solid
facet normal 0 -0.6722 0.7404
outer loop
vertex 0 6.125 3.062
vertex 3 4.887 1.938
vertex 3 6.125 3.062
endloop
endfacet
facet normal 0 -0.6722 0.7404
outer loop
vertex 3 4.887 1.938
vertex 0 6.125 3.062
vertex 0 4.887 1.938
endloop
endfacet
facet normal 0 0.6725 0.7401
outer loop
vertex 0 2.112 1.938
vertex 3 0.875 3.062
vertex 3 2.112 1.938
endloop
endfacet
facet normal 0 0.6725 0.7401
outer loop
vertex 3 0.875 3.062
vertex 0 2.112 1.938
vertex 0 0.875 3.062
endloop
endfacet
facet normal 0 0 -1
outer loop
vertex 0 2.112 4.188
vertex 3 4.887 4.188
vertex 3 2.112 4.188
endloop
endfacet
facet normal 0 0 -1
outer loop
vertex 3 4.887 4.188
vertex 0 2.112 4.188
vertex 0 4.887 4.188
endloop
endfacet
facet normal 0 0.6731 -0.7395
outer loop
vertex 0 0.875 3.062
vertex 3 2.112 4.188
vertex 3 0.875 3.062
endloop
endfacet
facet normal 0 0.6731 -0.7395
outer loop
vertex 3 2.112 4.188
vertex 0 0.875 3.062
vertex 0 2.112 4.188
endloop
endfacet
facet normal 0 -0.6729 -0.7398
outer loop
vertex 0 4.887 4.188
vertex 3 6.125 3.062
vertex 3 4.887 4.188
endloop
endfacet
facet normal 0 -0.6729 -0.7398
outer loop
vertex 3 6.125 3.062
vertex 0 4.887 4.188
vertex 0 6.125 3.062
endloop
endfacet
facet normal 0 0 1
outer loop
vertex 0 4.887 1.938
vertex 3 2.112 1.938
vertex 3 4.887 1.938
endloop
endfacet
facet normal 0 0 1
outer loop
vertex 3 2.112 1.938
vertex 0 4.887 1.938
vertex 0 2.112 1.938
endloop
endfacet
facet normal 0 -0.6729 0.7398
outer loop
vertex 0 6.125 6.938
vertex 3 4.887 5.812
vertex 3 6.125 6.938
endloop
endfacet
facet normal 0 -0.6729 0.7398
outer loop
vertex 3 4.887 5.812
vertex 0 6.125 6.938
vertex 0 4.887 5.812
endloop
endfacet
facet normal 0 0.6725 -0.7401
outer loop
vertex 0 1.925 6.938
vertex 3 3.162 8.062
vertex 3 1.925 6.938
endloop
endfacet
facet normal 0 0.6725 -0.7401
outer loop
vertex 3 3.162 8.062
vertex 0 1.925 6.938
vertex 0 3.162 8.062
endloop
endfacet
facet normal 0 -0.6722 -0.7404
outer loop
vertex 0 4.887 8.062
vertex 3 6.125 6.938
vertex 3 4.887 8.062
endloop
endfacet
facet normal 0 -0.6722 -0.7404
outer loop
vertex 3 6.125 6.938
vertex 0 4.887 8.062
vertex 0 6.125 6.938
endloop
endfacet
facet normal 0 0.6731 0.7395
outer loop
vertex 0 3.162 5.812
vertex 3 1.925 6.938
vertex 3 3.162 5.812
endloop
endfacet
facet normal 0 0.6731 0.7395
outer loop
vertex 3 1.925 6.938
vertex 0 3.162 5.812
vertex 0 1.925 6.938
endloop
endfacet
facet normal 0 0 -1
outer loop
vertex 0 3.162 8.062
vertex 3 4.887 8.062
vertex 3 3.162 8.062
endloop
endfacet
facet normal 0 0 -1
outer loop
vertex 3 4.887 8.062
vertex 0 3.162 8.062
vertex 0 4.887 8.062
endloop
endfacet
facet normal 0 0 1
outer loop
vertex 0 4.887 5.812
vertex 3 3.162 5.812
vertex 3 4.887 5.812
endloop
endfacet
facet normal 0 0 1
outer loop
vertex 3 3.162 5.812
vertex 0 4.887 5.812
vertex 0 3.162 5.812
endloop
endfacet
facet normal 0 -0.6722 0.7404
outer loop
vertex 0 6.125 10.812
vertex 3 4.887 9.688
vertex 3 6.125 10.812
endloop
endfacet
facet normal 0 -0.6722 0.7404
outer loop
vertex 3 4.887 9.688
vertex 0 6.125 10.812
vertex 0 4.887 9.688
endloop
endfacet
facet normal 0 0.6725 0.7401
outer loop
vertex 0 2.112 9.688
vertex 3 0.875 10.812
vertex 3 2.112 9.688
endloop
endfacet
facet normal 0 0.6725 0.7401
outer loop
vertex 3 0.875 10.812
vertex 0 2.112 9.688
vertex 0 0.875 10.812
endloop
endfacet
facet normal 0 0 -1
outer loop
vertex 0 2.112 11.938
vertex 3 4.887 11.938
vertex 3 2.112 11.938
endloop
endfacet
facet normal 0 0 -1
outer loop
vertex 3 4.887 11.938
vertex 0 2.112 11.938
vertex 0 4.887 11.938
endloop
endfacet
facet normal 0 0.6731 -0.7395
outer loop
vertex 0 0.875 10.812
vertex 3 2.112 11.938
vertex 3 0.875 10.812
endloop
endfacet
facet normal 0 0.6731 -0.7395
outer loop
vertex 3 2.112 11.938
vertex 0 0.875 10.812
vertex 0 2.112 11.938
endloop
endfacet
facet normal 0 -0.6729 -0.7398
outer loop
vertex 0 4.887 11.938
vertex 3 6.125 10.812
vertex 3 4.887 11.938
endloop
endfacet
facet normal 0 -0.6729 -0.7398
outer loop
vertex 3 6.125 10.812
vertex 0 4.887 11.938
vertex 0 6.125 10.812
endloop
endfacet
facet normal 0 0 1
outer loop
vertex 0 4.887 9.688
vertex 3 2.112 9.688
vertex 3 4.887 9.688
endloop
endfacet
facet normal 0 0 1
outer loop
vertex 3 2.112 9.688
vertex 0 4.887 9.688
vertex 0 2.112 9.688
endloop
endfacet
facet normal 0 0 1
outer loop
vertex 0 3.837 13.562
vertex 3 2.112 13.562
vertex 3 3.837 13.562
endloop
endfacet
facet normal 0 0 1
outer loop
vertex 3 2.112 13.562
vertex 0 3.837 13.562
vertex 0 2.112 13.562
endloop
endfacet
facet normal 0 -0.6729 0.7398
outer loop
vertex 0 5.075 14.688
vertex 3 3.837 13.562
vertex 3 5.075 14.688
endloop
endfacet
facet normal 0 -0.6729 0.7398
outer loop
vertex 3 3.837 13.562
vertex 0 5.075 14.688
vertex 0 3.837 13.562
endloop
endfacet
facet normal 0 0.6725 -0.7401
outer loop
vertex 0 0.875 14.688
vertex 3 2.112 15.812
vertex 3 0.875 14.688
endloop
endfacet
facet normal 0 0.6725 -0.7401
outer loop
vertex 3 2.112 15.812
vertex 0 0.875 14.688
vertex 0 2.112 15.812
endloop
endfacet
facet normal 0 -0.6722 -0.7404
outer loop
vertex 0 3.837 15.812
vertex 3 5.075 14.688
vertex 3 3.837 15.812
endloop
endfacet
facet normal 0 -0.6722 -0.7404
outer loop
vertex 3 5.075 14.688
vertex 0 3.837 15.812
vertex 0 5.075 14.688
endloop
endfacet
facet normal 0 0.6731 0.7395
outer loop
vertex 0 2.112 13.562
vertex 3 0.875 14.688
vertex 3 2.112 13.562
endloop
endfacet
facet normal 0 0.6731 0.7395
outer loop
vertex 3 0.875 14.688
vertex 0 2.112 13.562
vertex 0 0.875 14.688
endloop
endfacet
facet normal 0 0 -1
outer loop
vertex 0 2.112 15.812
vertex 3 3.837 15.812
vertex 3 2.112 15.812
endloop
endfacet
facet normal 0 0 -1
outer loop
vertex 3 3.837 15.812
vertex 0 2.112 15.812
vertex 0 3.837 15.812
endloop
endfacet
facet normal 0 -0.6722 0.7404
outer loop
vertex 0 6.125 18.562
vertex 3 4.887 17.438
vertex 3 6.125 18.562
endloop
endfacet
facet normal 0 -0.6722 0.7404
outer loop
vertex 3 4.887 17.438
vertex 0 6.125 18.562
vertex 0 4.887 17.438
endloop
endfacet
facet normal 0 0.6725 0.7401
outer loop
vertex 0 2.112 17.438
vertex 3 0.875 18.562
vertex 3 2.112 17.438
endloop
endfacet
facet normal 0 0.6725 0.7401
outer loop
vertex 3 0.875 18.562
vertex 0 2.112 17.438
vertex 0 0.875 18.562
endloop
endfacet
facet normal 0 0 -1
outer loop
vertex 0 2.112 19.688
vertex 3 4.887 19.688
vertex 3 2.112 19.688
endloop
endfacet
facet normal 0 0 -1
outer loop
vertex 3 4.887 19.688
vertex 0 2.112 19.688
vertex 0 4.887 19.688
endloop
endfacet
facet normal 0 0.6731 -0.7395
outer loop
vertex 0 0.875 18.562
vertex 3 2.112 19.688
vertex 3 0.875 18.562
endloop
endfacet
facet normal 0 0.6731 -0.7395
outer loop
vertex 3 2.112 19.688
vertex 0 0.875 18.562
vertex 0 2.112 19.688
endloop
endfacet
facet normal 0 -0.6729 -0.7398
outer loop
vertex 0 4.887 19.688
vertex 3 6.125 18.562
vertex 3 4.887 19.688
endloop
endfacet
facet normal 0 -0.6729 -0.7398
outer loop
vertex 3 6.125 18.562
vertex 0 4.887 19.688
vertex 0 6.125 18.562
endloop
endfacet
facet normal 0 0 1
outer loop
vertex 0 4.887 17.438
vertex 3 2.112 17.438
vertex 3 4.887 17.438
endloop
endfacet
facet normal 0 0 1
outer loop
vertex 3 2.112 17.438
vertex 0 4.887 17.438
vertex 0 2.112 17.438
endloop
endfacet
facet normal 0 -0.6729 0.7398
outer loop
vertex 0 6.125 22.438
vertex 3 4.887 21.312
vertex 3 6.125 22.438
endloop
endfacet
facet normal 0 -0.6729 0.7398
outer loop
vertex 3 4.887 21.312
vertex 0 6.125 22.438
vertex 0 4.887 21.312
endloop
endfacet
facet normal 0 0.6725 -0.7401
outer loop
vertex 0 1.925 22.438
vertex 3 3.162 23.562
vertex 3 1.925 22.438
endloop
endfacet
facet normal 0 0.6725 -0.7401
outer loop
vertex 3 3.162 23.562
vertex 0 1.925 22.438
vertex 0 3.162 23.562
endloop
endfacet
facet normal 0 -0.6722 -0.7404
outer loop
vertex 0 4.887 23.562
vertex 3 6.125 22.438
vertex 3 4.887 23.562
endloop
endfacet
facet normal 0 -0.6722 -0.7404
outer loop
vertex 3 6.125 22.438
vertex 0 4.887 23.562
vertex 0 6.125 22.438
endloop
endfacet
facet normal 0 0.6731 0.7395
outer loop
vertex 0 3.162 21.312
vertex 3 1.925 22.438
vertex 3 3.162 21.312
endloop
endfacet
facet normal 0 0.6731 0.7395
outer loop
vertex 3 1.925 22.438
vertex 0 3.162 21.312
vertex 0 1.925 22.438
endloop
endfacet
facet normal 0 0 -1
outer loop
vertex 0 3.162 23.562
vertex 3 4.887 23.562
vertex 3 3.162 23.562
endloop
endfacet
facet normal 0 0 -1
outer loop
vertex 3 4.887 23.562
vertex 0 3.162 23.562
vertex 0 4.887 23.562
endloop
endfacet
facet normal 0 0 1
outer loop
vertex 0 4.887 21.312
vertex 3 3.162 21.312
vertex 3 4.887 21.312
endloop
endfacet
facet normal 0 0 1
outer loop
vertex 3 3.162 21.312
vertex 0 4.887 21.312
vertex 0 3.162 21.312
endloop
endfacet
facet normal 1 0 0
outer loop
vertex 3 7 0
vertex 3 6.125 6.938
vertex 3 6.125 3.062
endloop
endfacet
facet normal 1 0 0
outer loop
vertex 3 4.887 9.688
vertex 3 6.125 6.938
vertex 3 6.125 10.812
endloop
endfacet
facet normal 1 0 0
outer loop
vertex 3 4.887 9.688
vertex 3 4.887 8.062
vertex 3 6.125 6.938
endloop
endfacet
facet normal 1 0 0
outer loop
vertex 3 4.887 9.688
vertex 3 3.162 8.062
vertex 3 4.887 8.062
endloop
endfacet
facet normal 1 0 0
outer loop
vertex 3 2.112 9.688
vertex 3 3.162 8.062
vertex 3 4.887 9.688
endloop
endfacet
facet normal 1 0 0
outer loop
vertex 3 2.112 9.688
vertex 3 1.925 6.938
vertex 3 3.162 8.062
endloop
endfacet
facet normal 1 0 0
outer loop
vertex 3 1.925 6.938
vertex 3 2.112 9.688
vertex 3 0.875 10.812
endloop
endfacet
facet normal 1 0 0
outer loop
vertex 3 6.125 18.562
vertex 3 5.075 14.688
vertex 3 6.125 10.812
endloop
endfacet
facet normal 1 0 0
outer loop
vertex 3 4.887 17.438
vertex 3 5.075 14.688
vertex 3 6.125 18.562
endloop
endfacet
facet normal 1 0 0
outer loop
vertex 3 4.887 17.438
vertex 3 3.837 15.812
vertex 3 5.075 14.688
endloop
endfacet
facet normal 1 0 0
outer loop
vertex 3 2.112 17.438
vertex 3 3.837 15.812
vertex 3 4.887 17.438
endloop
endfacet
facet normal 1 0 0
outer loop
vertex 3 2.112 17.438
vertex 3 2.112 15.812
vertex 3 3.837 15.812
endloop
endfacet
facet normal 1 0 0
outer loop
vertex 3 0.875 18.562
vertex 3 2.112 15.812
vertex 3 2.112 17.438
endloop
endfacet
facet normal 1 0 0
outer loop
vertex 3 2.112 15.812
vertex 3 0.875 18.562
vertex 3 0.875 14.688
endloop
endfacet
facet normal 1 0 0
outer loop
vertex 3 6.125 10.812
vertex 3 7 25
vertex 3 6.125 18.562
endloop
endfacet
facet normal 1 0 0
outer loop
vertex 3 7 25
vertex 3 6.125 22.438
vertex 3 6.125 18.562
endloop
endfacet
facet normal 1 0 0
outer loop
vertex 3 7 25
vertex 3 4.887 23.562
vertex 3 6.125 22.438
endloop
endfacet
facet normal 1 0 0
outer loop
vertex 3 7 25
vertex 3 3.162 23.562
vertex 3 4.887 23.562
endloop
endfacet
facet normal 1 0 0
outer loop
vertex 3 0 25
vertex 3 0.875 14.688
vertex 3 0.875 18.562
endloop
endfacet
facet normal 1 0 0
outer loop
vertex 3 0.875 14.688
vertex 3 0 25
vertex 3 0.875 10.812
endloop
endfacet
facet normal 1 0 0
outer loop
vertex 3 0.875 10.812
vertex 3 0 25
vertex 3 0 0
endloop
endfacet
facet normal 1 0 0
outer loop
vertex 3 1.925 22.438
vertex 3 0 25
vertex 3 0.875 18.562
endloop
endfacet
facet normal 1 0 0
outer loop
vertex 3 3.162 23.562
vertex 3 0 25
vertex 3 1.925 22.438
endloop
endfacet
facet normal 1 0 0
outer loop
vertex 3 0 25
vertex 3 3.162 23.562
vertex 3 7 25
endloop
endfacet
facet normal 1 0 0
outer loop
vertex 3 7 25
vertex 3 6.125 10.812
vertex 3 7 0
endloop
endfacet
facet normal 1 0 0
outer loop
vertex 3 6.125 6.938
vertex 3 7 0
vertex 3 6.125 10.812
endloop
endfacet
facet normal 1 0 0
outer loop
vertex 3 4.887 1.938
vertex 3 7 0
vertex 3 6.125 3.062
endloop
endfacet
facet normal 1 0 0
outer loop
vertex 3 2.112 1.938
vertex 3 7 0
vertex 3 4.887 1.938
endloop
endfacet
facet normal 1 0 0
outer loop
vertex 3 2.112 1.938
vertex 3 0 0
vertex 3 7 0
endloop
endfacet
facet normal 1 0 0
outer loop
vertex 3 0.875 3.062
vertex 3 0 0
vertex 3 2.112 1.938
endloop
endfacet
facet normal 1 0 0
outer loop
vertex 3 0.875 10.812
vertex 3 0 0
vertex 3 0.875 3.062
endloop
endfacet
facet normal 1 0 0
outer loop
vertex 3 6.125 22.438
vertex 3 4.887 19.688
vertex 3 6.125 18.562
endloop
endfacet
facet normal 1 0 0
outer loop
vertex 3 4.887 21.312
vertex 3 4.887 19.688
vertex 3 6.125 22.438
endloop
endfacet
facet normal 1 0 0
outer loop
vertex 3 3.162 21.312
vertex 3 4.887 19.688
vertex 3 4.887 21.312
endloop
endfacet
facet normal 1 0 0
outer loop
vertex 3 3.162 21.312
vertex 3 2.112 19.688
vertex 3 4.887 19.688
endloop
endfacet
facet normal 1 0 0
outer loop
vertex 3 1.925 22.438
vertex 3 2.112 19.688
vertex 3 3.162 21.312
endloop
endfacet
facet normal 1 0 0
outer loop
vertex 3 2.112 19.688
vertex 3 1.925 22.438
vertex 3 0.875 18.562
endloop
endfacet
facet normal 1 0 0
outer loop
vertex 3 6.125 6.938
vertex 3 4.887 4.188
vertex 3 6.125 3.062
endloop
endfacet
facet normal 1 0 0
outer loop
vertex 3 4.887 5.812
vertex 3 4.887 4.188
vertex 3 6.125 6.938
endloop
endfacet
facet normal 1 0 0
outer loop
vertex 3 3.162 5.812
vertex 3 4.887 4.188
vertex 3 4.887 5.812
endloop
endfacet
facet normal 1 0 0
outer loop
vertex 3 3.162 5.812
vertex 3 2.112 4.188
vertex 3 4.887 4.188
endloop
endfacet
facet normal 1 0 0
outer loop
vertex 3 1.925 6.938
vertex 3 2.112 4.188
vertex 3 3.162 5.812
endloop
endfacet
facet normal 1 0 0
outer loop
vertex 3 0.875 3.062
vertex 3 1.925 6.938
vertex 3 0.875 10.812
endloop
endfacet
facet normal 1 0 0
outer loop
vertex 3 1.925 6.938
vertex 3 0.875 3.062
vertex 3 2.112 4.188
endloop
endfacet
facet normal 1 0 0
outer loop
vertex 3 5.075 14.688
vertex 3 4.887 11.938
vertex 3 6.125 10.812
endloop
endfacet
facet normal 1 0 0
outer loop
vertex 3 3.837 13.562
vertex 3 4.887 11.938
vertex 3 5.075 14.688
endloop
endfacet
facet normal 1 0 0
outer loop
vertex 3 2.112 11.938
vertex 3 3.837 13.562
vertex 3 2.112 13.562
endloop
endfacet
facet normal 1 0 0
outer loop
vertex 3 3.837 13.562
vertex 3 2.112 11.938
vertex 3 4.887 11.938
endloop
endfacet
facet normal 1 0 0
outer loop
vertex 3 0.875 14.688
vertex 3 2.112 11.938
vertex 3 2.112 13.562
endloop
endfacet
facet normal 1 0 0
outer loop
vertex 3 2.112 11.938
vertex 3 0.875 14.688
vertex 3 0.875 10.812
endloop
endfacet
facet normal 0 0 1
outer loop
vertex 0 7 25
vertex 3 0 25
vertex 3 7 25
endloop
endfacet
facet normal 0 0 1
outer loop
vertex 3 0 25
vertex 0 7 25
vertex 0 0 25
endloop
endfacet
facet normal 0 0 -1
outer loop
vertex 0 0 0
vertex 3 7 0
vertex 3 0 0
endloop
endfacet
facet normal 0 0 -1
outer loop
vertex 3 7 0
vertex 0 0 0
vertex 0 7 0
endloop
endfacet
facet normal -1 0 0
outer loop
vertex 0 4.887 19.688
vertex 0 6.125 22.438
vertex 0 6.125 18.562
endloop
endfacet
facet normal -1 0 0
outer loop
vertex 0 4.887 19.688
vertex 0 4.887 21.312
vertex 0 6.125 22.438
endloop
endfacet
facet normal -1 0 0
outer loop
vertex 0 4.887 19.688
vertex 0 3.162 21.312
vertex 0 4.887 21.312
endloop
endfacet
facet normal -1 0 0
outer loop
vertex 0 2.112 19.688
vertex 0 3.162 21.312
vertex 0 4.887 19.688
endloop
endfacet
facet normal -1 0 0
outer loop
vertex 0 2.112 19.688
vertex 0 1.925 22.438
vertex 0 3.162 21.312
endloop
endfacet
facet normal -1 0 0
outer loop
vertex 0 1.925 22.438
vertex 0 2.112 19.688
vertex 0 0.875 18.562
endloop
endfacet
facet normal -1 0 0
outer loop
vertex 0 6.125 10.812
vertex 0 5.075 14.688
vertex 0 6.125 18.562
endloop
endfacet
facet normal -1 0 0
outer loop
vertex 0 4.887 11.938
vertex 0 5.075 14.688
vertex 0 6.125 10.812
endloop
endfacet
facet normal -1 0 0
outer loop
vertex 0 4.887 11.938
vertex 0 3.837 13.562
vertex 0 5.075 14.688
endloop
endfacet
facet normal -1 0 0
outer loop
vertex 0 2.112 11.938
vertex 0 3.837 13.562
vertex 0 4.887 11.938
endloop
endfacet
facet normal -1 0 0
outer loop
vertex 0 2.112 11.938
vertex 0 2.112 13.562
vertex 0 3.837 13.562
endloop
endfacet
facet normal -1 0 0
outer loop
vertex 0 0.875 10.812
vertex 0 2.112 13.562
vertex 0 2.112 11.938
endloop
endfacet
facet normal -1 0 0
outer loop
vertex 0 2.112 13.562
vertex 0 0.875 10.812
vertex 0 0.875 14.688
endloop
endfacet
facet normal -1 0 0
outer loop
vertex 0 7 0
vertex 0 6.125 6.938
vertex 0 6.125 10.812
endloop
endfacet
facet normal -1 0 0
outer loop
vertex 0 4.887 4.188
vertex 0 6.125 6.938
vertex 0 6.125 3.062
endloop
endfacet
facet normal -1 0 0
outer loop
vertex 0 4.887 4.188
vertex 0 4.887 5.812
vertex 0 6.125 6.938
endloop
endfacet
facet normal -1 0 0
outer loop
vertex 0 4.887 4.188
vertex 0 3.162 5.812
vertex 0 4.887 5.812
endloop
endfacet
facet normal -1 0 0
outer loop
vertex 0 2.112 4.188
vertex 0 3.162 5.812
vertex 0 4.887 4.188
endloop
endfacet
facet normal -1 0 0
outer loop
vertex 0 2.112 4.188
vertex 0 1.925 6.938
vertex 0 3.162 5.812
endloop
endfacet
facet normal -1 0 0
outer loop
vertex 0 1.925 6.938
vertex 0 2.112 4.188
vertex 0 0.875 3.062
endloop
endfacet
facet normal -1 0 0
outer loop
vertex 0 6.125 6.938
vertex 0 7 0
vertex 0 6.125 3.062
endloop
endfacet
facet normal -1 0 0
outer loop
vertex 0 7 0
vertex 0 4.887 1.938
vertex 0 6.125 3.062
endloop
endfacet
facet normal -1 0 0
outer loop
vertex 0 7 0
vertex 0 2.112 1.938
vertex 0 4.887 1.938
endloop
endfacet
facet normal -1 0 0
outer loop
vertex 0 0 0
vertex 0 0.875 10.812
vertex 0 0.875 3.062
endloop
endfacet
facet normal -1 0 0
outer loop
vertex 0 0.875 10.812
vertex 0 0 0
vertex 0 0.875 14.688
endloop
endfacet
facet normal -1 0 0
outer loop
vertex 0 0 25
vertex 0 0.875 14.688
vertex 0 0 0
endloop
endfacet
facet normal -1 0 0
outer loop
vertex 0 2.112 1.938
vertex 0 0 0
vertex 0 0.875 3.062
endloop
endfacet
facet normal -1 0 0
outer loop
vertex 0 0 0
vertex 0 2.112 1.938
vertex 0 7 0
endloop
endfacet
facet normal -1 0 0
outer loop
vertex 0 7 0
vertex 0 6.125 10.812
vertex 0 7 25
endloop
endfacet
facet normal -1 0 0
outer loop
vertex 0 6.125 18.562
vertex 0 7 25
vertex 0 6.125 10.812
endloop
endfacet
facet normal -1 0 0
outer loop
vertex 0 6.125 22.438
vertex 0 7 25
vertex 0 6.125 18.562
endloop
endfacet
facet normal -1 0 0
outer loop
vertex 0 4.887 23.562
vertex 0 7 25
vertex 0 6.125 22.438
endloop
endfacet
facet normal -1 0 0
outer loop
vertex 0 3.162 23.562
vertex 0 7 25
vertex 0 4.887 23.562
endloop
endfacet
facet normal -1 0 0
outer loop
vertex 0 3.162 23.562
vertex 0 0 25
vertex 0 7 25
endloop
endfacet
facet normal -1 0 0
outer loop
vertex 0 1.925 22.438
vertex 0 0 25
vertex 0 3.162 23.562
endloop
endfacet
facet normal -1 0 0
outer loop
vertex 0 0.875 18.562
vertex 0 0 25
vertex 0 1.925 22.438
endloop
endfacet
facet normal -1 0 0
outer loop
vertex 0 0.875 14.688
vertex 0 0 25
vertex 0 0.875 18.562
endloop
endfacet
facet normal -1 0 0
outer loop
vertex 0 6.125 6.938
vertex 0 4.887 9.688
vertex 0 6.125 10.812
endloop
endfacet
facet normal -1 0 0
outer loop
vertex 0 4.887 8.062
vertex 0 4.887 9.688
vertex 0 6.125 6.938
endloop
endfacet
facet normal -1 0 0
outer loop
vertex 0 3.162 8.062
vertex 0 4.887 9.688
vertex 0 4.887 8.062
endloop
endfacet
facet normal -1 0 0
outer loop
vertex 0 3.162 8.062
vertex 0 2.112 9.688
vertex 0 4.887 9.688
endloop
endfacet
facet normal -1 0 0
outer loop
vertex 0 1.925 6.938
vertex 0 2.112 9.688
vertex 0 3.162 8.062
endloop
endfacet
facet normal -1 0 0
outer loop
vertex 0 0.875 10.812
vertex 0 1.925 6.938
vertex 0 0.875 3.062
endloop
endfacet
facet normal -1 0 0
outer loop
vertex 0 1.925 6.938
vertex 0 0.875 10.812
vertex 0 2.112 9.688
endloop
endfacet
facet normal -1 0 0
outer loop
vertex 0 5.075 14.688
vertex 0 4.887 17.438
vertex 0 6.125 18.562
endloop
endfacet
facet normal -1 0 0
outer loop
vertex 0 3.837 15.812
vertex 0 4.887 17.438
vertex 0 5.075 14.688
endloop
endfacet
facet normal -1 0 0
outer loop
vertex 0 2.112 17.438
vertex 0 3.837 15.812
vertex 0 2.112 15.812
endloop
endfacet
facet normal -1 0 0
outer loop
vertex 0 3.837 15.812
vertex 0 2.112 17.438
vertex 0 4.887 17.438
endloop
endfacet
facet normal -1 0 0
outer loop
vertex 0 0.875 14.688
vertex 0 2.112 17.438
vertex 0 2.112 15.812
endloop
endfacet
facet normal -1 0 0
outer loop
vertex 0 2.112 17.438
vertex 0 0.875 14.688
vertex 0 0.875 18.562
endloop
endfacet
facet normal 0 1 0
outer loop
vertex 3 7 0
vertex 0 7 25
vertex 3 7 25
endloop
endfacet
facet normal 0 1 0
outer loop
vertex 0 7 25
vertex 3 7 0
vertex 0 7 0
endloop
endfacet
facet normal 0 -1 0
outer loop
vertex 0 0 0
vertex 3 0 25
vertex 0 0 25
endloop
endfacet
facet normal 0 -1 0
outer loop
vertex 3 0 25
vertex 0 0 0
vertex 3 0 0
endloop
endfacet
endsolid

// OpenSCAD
// file: ../vents.scad
module lowerVent1(w, h, extrusion)
{
    h1 = h - w * 1.2;
    h2 = h;
    rotate([90, 0, 90]) {
        linear_extrude(height=extrusion) {
            polygon([[-w/2,0], [w/2,0], [w/2,h1], [0,h2], [-w/2,h1]]);
        }
    }    
}


module vent1(w, h, n, extrusion, stop=100)
{
    angle = 360 / n;
    N = stop < n ? stop : n;

	for(r=[0:N-1]) {
		rotate([0, 0, angle*r]) {
            lowerVent1(w, h, extrusion);
        }
    }
}

module lowerVent2(w, h, extrusion)
{
    WH = w * 0.55;
    W2 = w / 2;

   rotate([90, 0, 90]) {
        linear_extrude(height=extrusion) {
            polygon([[0,0], [W2, WH], [W2, h - WH], [0, h], [-W2, h - WH], [-W2, WH]]);
        }
    }
}


module vent2(w, h, n, extrusion, stop=100)
{
    angle = 360 / n;
    N = stop < n ? stop : n;

	for(r=[0:N-1]) {
		rotate([0, 0, angle*r]) {
            lowerVent2(w, h, extrusion);
        }
    }
}

module vent3(w, h, n, extrusion)
{
    h1 = 0.6 * h;
    h2 = h;
    
	W = w / 2;
	IW = W * 0.62;
	IH = h1 * 0.38;
    
    angle = 360 / n;
	for(r=[0:n-1]) {
		rotate([0, 0, angle*r]) {

            rotate([90, 0, 90]) {
                linear_extrude(height=extrusion) {
                    difference() {
                        polygon([[-W,0], [W,0], [W,h1], [0,h2], [-W,h1]]);
                        polygon([[-IW, 0], [IW, 0], [IW, IH], [-IW, IH]]);
                    }
                }
            }
        }
	}
}

module vent4(h, r, extrusion)
{
    alpha = 16;
    w = sin(alpha) * r;

	for(i=[0:11]) {
		rotate([0, 0, 30*i]) {
			rotate([90, 0, 90]) {
				linear_extrude(height=extrusion) {
					polygon([[-w/2, 0], [w/2, 0], [0, h] ]);
				}
			}
		}
		rotate([0, 0, 30*i + 15]) {
			rotate([90, 0, 90]) {
				linear_extrude(height=extrusion) {
					polygon([[-w/2, h], [0, 0], [w/2, h] ]);
				}
			}
		}
	}
}


difference() 
{
    H = 16;
    D = D_INNER;
	tube(H, D/2 - 2, D/2);	
    
	translate([0, 0, 3]) {
        //vent1(6, H-6, 10, 40);
        //vent2(6, H-6, 8, 40);
        vent3(6, H-6, 7, 40);
		//vent4(H-6, D/2, D);
	}
}
// main file
use <../vents.scad>

EPS = 0.01;
EPS2 = EPS * 2;

module hexShape(w, h, d)
{
	// Translate to cube coordinates.
	translate([w/2, 0, 0]) rotate([-90, -90, 0]) lowerVent2(w, h, d);
}

module beam(w, h, d)
{
    
    innerW = w * 0.75;
    innerH = h * 0.75;
    deltaW = w - innerW;
    deltaH = h - innerH;

    W = h / 2;
    endPad = W / 4;
    nSide = floor((d - endPad*2) / W);
    space = (d - endPad*2) / nSide;

    difference() {
        cube(size=[w, h, d]);
        for(i=[0:nSide-1]) 
    	{
            N = 4;
            VAR_H = [1.0, 0.8, 1.0, 0.8]; //, 0.9, 0.6, 1.0, 0.8];
            VAR_Y = [0.0, 0.2, 0.0, 0.0]; // 0.2, 0.1, 0.0, 0.0];

            y = deltaH / 2 + innerH * VAR_Y[i%N];

        	translate([w + EPS, y, space/2 + space*i]) 
                rotate([0, -90, 0])
                    hexShape(innerW, innerH * VAR_H[i%N], w + EPS2);
        }
    }
}

beam(3, 7, 25);
